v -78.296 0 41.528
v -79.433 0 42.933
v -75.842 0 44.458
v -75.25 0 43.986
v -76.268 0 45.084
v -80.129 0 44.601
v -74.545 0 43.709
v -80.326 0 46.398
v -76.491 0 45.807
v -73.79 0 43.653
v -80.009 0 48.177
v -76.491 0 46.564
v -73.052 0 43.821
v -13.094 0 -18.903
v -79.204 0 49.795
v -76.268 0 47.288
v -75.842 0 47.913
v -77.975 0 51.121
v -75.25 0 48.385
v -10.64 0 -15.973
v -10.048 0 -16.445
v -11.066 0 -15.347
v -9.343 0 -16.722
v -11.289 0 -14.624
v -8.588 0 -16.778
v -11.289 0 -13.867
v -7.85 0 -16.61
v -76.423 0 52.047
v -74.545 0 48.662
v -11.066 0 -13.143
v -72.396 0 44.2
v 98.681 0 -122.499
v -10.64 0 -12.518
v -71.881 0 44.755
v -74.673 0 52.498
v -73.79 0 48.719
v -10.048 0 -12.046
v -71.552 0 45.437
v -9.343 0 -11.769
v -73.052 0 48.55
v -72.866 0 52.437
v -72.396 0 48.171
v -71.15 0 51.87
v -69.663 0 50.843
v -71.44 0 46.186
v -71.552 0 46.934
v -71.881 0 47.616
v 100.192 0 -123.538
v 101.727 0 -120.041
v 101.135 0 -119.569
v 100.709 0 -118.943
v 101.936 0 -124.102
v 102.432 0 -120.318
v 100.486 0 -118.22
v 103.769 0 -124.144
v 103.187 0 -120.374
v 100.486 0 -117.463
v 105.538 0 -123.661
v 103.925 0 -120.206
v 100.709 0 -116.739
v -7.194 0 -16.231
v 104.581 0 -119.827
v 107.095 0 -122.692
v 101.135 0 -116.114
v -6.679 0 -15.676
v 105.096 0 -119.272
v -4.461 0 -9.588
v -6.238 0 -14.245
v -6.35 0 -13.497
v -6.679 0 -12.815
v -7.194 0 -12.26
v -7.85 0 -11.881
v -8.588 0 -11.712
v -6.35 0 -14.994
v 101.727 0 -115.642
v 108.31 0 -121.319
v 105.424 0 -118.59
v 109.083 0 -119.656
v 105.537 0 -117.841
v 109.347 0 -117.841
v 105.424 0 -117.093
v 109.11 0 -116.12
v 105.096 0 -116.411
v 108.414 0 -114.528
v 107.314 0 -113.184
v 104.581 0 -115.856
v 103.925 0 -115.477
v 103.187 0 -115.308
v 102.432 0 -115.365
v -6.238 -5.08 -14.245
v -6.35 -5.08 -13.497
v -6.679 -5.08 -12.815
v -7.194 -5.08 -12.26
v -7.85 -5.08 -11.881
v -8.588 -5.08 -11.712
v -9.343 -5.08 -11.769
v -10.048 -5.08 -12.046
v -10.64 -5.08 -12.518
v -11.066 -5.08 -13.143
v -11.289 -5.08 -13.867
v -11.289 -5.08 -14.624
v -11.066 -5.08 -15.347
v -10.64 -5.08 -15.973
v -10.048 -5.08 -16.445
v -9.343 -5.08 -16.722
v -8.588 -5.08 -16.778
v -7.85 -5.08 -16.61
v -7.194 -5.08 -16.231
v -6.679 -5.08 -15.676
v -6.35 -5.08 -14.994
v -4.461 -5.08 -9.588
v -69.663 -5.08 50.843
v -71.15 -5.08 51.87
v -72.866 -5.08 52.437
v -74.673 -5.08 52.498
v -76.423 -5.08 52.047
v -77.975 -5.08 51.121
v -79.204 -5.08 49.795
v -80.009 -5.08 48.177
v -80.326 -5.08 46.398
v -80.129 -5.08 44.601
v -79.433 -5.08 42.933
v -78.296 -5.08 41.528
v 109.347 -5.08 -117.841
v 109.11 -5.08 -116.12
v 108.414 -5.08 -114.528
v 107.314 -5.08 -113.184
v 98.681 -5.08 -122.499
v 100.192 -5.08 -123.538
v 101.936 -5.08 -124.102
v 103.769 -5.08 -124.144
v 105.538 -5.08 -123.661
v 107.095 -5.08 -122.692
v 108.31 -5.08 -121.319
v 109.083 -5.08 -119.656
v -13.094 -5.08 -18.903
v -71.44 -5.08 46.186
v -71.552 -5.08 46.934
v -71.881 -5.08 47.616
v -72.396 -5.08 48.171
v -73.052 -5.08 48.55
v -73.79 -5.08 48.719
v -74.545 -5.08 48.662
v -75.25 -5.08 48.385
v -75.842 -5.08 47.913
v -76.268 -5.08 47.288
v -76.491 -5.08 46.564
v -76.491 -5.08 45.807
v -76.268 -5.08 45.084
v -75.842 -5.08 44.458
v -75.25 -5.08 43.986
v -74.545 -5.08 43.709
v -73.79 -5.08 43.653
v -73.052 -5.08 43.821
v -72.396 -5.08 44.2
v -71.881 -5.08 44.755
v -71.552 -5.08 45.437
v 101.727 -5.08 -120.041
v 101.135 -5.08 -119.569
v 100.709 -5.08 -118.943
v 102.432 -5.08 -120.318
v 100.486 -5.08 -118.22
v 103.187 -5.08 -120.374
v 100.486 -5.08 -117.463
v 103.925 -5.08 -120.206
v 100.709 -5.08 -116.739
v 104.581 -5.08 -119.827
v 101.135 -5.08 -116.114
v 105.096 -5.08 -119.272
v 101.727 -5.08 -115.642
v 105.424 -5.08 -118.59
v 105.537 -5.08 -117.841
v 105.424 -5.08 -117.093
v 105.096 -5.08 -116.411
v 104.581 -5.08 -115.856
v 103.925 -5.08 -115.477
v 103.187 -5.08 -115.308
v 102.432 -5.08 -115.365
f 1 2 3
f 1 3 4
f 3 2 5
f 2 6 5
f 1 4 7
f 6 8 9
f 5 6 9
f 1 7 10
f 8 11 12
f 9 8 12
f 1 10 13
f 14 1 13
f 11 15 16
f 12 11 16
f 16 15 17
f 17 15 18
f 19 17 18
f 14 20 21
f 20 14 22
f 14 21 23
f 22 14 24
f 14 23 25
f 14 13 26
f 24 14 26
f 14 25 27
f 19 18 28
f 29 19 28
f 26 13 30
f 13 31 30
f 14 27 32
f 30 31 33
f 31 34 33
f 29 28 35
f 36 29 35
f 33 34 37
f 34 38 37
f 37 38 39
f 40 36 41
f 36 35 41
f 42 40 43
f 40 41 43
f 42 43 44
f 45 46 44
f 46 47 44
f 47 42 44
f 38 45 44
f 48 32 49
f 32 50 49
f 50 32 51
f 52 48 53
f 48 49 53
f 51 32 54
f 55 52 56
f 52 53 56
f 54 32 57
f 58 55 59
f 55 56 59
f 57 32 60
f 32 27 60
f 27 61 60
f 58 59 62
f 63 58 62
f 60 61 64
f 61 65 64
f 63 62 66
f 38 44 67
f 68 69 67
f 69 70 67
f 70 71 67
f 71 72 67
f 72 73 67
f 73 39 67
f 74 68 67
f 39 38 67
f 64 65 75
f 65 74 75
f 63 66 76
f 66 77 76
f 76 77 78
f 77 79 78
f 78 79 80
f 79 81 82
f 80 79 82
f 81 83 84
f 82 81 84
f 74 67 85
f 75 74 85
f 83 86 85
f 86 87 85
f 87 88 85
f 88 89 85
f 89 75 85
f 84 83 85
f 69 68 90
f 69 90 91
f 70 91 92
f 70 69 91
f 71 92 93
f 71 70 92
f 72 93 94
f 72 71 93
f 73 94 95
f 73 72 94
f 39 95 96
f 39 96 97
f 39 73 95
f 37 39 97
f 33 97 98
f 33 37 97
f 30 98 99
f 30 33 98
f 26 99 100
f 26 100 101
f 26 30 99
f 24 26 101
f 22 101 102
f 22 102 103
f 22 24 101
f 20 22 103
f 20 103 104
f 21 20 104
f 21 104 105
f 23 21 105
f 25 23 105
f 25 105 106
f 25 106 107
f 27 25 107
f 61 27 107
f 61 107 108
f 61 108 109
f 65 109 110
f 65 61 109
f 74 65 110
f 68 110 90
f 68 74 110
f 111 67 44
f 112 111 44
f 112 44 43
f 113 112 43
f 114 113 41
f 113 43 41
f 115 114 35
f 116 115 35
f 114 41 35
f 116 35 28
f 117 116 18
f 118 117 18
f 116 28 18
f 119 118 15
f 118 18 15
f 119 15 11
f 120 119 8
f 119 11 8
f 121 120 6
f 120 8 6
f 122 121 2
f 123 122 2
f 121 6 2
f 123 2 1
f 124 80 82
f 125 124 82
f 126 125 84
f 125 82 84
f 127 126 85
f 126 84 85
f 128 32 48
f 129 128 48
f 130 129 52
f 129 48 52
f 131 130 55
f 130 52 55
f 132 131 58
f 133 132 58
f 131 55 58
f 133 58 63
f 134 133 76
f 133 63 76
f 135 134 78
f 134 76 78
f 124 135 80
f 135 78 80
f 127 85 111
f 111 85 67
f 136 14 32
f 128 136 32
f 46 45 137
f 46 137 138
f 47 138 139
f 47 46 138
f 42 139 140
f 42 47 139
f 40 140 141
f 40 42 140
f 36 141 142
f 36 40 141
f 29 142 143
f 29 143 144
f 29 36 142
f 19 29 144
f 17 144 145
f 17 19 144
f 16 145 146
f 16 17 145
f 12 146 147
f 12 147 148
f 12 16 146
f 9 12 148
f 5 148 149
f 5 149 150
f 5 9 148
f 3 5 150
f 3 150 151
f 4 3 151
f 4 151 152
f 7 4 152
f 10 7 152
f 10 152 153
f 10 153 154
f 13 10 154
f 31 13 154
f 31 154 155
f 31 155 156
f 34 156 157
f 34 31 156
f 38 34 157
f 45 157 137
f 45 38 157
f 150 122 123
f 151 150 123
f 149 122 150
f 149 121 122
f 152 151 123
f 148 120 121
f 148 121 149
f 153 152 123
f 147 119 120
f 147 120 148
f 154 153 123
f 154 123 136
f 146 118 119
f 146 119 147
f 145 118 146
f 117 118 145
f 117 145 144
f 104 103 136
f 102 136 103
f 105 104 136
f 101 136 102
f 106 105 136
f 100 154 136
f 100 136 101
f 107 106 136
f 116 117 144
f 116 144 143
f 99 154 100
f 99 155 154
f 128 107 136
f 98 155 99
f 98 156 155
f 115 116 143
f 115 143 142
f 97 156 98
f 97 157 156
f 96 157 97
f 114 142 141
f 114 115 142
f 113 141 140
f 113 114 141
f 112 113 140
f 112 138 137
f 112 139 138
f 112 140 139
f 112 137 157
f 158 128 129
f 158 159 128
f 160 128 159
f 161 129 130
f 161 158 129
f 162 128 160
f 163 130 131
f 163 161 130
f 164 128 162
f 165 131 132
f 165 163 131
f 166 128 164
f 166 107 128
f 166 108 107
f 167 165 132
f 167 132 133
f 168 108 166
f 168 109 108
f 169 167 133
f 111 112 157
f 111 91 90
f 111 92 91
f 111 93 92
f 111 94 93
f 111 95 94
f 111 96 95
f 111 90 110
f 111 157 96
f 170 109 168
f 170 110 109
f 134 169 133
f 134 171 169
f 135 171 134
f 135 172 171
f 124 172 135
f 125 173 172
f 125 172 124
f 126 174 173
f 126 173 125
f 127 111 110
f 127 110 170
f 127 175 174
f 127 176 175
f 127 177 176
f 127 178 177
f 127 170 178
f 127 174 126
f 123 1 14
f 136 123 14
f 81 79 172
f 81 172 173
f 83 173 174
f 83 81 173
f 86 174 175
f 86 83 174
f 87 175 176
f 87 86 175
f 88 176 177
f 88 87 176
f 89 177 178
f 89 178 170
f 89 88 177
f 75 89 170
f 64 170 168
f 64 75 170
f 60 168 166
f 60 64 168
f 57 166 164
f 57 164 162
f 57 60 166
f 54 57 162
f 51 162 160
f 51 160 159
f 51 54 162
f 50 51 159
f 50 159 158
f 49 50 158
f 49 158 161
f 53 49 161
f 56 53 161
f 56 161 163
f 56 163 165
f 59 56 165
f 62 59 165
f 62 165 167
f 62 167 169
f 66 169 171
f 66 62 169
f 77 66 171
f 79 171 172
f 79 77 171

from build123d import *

# Parameters (mm, degrees)
F0_R     = 2.54
F1_DEPTH = 5.08


with BuildPart() as f1:
    # F0 (on Front) → F1 (new body)
    with BuildSketch(Plane.XZ):
        with BuildLine():
            ThreePointArc((-78.2961119143, 41.5283401708), (-71.4386747563, 40.3661663473), (-67.6296123648, 46.1856281841))
            ThreePointArc((-67.6296123648, 46.1856281841), (-68.160150528, 48.7265657925), (-69.6631128152, 50.8429161974))
            ThreePointArc((-69.6631128152, 50.8429161974), (-78.636900378, 50.5021277337), (-78.2961119143, 41.5283401708))
        make_face()
        with Locations((-73.9796123648, 46.1856281841)):
            Circle(F0_R, mode=Mode.SUBTRACT)
        with BuildLine():
            ThreePointArc((-69.6631128152, 50.8429161974), (-68.160150528, 48.7265657925), (-67.6296123648, 46.1856281841))
            ThreePointArc((-67.6296123648, 46.1856281841), (-71.4386747563, 40.3661663473), (-78.2961119143, 41.5283401708))
            Line((-78.2961119143, 41.5283401708), (-13.094079489, -18.9026537454))
            ThreePointArc((-13.094079489, -18.9026537454), (-13.4348682543, -9.9288660273), (-4.4610805236, -9.5880775949))
            Line((-4.4610805236, -9.5880775949), (-69.6631128152, 50.8429161974))
        make_face()
        with BuildLine():
            Line((107.3138316889, -113.1840666865), (-4.4610805236, -9.5880775949))
            ThreePointArc((-4.4610805236, -9.5880775949), (-2.9581183134, -11.7044279677), (-2.427580179, -14.24536551))
            ThreePointArc((-2.427580179, -14.24536551), (-6.2366424208, -20.0648272814), (-13.094079489, -18.9026537454))
            Line((-13.094079489, -18.9026537454), (98.6808325898, -122.4986427131))
            ThreePointArc((98.6808325898, -122.4986427131), (98.3400441261, -113.5248551502), (107.3138316889, -113.1840666865))
        make_face()
        with BuildLine():
            ThreePointArc((-2.427580179, -14.24536551), (-2.9581183134, -11.7044279677), (-4.4610805236, -9.5880775949))
            ThreePointArc((-4.4610805236, -9.5880775949), (-13.4348682543, -9.9288660273), (-13.094079489, -18.9026537454))
            ThreePointArc((-13.094079489, -18.9026537454), (-6.2366424208, -20.0648272814), (-2.427580179, -14.24536551))
        make_face()
        with Locations((-8.777580179, -14.24536551)):
            Circle(F0_R, mode=Mode.SUBTRACT)
        with BuildLine():
            ThreePointArc((109.3473321393, -117.8413546998), (108.8167939761, -115.3004170913), (107.3138316889, -113.1840666865))
            ThreePointArc((107.3138316889, -113.1840666865), (98.3400441261, -113.5248551502), (98.6808325898, -122.4986427131))
            ThreePointArc((98.6808325898, -122.4986427131), (105.5382697478, -123.6608165366), (109.3473321393, -117.8413546998))
        make_face()
        with Locations((102.9973321393, -117.8413546998)):
            Circle(F0_R, mode=Mode.SUBTRACT)
    extrude(amount=F1_DEPTH)


solid = f1.part
